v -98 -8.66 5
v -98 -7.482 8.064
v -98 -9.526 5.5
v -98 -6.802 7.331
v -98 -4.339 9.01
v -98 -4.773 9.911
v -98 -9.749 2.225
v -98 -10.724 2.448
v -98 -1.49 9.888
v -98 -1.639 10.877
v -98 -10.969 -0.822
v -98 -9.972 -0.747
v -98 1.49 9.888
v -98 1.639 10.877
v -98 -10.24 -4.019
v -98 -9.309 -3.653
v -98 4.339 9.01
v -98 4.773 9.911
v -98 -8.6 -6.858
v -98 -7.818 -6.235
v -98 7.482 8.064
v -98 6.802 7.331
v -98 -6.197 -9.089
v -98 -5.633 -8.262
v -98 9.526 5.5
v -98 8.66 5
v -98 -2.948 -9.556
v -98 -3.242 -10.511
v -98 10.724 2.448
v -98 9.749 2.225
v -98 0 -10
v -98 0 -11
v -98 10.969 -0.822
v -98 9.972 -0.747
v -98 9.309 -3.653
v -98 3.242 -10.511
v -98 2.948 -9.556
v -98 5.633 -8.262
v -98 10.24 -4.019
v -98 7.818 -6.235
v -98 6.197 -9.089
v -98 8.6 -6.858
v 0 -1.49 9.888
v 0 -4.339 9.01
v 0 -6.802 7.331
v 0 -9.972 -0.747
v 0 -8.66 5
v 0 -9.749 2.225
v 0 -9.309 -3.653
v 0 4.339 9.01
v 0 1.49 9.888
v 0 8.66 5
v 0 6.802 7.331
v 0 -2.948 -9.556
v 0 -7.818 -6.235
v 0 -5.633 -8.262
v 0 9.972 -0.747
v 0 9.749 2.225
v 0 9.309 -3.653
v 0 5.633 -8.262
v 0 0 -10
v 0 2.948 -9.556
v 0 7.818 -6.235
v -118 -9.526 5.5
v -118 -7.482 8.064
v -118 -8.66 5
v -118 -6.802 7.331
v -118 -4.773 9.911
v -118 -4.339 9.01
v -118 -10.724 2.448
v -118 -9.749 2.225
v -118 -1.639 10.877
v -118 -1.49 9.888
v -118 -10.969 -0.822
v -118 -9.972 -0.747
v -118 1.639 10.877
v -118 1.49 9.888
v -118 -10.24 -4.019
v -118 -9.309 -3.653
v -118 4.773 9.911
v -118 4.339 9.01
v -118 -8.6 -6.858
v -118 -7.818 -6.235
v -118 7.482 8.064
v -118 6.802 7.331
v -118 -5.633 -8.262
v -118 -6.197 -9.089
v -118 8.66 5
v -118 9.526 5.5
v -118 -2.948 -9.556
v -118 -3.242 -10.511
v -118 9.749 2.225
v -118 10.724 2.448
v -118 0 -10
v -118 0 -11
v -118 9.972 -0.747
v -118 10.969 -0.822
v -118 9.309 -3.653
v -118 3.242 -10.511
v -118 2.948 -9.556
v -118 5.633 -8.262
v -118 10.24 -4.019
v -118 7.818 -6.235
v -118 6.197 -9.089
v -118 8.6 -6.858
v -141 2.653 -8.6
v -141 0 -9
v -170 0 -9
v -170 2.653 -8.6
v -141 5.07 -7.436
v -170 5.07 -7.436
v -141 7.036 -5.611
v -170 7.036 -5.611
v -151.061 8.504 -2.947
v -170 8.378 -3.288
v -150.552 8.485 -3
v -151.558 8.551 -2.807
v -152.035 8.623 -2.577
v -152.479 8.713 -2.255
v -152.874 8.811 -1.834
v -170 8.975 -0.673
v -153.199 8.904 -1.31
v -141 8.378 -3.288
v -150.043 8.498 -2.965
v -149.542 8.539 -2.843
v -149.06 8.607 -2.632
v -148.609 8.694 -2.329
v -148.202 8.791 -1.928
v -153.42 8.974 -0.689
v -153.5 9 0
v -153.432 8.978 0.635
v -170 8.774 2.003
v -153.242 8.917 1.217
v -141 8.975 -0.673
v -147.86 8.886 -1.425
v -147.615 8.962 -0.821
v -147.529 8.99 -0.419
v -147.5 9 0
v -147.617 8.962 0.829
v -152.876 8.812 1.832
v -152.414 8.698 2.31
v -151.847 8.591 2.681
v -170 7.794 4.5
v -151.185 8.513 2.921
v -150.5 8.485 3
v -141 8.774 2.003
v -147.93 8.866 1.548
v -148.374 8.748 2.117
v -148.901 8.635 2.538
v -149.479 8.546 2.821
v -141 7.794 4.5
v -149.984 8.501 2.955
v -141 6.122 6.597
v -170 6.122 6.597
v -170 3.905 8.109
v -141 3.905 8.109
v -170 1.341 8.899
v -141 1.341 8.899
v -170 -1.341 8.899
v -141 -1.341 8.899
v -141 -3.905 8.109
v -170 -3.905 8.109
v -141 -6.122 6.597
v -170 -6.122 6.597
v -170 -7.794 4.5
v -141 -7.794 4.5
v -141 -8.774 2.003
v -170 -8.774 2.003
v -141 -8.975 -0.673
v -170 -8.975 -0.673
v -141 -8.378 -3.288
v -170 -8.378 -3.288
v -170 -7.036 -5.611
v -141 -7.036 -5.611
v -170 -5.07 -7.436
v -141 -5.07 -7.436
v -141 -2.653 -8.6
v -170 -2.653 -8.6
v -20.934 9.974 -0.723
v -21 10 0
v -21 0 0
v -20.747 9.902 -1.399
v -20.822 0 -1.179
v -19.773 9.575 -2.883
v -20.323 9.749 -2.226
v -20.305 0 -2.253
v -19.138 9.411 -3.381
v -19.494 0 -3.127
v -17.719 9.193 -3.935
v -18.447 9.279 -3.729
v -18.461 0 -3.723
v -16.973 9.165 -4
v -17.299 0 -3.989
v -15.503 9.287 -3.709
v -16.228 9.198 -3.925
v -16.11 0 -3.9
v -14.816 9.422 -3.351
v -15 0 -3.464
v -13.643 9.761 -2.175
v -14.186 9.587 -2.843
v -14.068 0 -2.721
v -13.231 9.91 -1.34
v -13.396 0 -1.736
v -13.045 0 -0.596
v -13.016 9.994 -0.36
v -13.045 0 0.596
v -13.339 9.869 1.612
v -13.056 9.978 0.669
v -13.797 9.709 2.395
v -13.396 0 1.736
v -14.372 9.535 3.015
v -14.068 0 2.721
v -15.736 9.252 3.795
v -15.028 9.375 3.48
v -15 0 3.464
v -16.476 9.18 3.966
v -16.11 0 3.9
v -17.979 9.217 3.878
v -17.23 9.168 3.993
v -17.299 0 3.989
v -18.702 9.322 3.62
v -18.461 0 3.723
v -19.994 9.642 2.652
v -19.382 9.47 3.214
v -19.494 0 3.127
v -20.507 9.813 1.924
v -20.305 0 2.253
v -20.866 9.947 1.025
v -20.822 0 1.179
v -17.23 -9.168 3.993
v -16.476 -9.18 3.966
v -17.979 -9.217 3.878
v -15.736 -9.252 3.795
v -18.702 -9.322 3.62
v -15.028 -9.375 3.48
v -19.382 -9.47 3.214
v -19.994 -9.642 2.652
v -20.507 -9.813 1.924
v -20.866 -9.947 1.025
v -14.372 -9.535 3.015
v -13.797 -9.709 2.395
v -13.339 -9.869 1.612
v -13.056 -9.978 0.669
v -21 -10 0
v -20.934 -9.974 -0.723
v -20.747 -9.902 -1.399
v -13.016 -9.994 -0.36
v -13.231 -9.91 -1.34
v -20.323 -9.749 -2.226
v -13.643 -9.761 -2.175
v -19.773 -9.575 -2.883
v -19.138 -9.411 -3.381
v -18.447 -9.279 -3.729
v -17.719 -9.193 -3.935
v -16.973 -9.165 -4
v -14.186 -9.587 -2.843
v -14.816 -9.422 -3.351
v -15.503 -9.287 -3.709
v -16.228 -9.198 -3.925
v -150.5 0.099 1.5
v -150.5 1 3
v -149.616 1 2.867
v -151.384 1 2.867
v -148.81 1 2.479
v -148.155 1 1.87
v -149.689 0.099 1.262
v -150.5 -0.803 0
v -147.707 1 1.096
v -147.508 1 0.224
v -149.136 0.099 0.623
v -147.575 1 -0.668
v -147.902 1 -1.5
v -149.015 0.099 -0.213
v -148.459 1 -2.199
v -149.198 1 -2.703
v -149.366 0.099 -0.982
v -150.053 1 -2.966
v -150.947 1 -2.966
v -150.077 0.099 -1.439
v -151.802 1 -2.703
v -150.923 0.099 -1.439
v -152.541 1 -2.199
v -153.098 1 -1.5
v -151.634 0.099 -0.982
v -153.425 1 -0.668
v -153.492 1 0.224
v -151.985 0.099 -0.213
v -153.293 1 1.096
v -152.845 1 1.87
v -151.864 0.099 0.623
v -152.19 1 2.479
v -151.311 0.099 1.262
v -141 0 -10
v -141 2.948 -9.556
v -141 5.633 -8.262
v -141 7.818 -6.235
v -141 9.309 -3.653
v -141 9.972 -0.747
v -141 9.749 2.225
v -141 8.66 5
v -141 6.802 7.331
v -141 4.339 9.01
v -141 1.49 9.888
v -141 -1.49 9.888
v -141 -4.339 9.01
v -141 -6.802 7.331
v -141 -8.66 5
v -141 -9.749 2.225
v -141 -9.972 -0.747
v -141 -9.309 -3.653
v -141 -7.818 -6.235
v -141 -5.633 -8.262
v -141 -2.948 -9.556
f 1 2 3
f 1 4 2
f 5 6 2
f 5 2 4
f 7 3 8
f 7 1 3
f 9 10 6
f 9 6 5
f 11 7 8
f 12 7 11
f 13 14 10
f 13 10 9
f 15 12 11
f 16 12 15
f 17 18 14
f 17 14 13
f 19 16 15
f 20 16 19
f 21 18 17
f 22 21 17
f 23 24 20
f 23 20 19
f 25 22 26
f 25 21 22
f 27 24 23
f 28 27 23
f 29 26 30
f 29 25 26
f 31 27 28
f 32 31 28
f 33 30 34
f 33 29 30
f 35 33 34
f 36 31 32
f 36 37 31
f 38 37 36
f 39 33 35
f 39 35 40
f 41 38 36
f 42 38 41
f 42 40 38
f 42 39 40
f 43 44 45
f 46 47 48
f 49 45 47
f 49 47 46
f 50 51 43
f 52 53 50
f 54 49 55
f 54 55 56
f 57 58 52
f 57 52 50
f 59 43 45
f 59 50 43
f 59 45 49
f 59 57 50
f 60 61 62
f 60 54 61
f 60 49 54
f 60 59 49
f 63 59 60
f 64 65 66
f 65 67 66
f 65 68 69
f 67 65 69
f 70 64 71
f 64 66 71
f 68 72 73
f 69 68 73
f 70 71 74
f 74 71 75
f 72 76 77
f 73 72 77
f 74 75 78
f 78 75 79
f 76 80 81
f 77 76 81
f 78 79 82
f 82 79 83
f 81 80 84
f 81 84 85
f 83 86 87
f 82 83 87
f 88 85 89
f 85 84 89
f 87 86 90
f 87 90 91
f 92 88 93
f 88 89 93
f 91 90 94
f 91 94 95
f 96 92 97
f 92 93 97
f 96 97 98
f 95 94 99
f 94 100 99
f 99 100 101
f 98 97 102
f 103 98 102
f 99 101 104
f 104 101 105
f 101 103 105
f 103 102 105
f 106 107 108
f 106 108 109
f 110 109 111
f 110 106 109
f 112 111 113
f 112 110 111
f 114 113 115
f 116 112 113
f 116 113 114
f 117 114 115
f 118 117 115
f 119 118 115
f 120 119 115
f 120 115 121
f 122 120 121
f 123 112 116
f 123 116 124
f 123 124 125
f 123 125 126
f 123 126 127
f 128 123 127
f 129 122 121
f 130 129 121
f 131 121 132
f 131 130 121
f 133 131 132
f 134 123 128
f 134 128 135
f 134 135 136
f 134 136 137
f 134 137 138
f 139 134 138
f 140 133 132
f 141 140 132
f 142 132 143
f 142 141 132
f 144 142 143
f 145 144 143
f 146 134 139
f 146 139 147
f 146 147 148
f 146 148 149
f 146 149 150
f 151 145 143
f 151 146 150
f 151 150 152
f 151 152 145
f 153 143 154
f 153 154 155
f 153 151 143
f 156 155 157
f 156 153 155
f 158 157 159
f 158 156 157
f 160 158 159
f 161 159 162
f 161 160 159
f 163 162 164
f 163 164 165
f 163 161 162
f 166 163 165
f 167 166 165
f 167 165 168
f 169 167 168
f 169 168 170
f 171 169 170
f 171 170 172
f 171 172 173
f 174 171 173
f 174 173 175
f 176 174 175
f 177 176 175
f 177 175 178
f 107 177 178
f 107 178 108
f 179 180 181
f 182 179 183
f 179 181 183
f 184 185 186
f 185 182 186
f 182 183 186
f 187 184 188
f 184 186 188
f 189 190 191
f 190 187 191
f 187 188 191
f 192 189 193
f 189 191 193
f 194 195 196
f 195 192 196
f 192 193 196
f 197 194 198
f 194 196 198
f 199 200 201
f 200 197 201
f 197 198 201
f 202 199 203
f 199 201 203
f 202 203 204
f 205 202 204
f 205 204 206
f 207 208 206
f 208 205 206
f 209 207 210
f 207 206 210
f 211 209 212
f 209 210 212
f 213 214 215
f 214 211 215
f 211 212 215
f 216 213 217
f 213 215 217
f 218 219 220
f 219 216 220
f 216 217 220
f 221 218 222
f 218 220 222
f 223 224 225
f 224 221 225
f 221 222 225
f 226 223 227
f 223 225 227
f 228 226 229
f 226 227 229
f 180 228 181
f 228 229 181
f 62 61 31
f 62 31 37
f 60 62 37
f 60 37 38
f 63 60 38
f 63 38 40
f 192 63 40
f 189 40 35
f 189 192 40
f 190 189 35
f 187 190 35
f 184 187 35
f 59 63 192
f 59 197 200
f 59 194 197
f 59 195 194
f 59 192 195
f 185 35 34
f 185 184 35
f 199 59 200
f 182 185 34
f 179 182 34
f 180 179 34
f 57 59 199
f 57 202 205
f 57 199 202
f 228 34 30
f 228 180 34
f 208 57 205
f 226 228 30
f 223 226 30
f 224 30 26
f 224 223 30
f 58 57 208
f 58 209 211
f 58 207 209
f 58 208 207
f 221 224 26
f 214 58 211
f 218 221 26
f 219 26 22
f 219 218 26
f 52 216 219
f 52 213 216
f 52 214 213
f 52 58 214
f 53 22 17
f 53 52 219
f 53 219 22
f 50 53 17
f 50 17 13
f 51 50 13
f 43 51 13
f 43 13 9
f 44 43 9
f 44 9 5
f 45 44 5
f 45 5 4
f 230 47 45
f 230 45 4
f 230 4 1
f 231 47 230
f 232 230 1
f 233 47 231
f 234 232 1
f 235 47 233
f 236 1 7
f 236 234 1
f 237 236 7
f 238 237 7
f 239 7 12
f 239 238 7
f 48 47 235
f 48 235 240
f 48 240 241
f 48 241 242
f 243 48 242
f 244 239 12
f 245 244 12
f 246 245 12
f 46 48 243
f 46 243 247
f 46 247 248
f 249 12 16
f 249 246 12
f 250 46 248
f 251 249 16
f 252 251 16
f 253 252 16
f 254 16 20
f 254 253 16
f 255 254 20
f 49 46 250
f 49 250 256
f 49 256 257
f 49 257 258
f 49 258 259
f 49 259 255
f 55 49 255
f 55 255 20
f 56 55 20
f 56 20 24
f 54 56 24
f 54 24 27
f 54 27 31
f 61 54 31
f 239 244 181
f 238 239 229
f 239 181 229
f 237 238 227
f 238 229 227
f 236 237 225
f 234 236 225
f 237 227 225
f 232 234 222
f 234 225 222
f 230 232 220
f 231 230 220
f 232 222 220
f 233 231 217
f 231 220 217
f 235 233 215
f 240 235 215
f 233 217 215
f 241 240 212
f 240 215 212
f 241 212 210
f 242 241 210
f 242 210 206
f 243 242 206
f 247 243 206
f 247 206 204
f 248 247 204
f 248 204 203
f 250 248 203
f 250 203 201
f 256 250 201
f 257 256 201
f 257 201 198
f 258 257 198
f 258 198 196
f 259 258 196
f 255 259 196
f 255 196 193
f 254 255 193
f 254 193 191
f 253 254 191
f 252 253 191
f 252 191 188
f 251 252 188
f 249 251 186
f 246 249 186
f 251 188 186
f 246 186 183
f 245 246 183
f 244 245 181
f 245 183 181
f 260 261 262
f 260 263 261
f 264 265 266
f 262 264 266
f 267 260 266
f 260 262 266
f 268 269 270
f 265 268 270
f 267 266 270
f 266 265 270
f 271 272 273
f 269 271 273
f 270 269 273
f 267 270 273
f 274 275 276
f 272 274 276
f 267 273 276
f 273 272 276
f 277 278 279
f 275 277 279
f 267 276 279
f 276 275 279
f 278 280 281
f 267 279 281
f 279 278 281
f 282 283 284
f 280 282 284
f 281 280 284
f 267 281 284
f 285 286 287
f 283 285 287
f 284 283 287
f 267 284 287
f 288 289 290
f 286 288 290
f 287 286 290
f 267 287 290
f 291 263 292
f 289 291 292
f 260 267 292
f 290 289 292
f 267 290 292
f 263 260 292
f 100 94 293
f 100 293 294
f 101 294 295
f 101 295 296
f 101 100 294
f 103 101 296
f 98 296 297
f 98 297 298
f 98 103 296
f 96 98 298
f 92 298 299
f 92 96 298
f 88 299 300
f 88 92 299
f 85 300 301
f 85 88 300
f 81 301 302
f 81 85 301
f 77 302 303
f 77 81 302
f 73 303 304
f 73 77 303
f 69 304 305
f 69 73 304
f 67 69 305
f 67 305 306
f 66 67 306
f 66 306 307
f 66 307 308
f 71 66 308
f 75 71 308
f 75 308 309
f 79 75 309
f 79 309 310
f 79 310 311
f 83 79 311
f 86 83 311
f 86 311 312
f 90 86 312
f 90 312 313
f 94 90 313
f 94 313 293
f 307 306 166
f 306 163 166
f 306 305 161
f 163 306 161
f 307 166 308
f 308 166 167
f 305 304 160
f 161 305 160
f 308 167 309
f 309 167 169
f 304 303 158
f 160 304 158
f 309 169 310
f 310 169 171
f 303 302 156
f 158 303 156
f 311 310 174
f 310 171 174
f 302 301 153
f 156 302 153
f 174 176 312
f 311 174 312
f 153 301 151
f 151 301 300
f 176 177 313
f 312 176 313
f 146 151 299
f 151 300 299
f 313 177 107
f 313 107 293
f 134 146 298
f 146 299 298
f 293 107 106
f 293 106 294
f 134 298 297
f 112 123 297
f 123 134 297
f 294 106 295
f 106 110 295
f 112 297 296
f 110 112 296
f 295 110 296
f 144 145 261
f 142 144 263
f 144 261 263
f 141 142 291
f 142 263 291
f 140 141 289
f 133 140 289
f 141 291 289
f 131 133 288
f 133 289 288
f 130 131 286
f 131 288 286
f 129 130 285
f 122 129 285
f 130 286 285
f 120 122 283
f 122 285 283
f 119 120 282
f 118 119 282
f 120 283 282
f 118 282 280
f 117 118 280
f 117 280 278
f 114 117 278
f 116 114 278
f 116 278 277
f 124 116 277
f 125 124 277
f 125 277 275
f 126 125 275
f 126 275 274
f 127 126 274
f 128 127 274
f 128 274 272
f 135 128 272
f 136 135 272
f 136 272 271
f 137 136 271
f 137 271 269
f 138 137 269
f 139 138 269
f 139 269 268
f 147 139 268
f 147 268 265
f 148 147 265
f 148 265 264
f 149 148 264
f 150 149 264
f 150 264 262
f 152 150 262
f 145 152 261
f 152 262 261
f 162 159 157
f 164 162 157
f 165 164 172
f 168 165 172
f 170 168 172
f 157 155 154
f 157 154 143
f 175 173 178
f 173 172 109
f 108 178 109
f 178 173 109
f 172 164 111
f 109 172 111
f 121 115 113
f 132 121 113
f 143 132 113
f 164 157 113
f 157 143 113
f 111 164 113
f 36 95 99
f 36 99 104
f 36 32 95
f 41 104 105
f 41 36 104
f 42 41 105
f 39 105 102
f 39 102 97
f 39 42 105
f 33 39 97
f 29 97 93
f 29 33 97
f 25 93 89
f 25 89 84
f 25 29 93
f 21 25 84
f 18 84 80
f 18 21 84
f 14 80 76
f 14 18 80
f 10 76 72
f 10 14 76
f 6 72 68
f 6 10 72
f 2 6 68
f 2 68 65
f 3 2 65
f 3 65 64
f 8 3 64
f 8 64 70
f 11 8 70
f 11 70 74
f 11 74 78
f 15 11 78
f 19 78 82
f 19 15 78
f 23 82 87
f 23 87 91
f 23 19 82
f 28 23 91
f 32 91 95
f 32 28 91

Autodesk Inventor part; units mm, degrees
ref_plane "YZ Plane" through (0, 0, 0) normal (1, 0, 0) x (0, 1, 0)
ref_plane "XY Plane" through (0, 0, 0) normal (0, 0, 1) x (1, 0, 0)
sketch "スケッチ1" plane through (0, 0, 0) normal (0, 1, 0) x (-1, 0, 0)
  line L0 (204, 0) -> (-34, 0) projected
  line L1 (0, -13.2) -> (0, 2.2) projected
  line L2 (170, 0) -> (170, -9)
  line L3 (118, -11) -> (98, -11)
  line L4 (98, -11) -> (98, -10)
  line L5 (98, -10) -> (0, -10)
  line L6 (0, -10) -> (0, 0)
  line L7 (170, 0) -> (0, 0)
  line L8 (170, -9) -> (141, -9)
  line L9 (141, -9) -> (141, -10)
  line L10 (141, -10) -> (118, -10)
  line L11 (118, -10) -> (118, -11)
  dimension "d1" = 11
  dimension "d2" = 10
  dimension "d3" = 9
  dimension "d4" = 10
  dimension "d6" = 29
  dimension "d8" = 23
  dimension "d9" = 20
  dimension "d10" = 170
revolve "回転1" add sketch "スケッチ1" angle 360 about axis through (-170, 0, 0) along (1, 0, 0)
sketch "スケッチ2" plane through (0, 0, 0) normal (0, 1, 0) x (-1, 0, 0)
  circle A0 centre (17, 0) radius 4
  line L0 (0, 10) -> (0, -10) projected
  point P0 (0, 0)
  dimension "d12" = 8
  dimension "d13" = 17
extrude "押し出し2" cut sketch "スケッチ2" along normal through all both and the other way through all
ref_plane "作業平面1" through (0, 9, 0) normal (0, 1, 0) x (-1, 0, 0)
sketch "スケッチ3" plane through (0, 9, 0) normal (0, 1, 0) x (-1, 0, 0)
  line L0 (170, 9) -> (170, -9) projected
  point P0 (0, 0)
  point P1 (150.5, 0)
  dimension "d19" = 19.5
hole "穴1" at (-150.5, 9, 0) direction (0, -1, 0) diameter 6 depth 8 tip angle 118
properties part number "Shaft_main" material "アルミニウム 6061"
